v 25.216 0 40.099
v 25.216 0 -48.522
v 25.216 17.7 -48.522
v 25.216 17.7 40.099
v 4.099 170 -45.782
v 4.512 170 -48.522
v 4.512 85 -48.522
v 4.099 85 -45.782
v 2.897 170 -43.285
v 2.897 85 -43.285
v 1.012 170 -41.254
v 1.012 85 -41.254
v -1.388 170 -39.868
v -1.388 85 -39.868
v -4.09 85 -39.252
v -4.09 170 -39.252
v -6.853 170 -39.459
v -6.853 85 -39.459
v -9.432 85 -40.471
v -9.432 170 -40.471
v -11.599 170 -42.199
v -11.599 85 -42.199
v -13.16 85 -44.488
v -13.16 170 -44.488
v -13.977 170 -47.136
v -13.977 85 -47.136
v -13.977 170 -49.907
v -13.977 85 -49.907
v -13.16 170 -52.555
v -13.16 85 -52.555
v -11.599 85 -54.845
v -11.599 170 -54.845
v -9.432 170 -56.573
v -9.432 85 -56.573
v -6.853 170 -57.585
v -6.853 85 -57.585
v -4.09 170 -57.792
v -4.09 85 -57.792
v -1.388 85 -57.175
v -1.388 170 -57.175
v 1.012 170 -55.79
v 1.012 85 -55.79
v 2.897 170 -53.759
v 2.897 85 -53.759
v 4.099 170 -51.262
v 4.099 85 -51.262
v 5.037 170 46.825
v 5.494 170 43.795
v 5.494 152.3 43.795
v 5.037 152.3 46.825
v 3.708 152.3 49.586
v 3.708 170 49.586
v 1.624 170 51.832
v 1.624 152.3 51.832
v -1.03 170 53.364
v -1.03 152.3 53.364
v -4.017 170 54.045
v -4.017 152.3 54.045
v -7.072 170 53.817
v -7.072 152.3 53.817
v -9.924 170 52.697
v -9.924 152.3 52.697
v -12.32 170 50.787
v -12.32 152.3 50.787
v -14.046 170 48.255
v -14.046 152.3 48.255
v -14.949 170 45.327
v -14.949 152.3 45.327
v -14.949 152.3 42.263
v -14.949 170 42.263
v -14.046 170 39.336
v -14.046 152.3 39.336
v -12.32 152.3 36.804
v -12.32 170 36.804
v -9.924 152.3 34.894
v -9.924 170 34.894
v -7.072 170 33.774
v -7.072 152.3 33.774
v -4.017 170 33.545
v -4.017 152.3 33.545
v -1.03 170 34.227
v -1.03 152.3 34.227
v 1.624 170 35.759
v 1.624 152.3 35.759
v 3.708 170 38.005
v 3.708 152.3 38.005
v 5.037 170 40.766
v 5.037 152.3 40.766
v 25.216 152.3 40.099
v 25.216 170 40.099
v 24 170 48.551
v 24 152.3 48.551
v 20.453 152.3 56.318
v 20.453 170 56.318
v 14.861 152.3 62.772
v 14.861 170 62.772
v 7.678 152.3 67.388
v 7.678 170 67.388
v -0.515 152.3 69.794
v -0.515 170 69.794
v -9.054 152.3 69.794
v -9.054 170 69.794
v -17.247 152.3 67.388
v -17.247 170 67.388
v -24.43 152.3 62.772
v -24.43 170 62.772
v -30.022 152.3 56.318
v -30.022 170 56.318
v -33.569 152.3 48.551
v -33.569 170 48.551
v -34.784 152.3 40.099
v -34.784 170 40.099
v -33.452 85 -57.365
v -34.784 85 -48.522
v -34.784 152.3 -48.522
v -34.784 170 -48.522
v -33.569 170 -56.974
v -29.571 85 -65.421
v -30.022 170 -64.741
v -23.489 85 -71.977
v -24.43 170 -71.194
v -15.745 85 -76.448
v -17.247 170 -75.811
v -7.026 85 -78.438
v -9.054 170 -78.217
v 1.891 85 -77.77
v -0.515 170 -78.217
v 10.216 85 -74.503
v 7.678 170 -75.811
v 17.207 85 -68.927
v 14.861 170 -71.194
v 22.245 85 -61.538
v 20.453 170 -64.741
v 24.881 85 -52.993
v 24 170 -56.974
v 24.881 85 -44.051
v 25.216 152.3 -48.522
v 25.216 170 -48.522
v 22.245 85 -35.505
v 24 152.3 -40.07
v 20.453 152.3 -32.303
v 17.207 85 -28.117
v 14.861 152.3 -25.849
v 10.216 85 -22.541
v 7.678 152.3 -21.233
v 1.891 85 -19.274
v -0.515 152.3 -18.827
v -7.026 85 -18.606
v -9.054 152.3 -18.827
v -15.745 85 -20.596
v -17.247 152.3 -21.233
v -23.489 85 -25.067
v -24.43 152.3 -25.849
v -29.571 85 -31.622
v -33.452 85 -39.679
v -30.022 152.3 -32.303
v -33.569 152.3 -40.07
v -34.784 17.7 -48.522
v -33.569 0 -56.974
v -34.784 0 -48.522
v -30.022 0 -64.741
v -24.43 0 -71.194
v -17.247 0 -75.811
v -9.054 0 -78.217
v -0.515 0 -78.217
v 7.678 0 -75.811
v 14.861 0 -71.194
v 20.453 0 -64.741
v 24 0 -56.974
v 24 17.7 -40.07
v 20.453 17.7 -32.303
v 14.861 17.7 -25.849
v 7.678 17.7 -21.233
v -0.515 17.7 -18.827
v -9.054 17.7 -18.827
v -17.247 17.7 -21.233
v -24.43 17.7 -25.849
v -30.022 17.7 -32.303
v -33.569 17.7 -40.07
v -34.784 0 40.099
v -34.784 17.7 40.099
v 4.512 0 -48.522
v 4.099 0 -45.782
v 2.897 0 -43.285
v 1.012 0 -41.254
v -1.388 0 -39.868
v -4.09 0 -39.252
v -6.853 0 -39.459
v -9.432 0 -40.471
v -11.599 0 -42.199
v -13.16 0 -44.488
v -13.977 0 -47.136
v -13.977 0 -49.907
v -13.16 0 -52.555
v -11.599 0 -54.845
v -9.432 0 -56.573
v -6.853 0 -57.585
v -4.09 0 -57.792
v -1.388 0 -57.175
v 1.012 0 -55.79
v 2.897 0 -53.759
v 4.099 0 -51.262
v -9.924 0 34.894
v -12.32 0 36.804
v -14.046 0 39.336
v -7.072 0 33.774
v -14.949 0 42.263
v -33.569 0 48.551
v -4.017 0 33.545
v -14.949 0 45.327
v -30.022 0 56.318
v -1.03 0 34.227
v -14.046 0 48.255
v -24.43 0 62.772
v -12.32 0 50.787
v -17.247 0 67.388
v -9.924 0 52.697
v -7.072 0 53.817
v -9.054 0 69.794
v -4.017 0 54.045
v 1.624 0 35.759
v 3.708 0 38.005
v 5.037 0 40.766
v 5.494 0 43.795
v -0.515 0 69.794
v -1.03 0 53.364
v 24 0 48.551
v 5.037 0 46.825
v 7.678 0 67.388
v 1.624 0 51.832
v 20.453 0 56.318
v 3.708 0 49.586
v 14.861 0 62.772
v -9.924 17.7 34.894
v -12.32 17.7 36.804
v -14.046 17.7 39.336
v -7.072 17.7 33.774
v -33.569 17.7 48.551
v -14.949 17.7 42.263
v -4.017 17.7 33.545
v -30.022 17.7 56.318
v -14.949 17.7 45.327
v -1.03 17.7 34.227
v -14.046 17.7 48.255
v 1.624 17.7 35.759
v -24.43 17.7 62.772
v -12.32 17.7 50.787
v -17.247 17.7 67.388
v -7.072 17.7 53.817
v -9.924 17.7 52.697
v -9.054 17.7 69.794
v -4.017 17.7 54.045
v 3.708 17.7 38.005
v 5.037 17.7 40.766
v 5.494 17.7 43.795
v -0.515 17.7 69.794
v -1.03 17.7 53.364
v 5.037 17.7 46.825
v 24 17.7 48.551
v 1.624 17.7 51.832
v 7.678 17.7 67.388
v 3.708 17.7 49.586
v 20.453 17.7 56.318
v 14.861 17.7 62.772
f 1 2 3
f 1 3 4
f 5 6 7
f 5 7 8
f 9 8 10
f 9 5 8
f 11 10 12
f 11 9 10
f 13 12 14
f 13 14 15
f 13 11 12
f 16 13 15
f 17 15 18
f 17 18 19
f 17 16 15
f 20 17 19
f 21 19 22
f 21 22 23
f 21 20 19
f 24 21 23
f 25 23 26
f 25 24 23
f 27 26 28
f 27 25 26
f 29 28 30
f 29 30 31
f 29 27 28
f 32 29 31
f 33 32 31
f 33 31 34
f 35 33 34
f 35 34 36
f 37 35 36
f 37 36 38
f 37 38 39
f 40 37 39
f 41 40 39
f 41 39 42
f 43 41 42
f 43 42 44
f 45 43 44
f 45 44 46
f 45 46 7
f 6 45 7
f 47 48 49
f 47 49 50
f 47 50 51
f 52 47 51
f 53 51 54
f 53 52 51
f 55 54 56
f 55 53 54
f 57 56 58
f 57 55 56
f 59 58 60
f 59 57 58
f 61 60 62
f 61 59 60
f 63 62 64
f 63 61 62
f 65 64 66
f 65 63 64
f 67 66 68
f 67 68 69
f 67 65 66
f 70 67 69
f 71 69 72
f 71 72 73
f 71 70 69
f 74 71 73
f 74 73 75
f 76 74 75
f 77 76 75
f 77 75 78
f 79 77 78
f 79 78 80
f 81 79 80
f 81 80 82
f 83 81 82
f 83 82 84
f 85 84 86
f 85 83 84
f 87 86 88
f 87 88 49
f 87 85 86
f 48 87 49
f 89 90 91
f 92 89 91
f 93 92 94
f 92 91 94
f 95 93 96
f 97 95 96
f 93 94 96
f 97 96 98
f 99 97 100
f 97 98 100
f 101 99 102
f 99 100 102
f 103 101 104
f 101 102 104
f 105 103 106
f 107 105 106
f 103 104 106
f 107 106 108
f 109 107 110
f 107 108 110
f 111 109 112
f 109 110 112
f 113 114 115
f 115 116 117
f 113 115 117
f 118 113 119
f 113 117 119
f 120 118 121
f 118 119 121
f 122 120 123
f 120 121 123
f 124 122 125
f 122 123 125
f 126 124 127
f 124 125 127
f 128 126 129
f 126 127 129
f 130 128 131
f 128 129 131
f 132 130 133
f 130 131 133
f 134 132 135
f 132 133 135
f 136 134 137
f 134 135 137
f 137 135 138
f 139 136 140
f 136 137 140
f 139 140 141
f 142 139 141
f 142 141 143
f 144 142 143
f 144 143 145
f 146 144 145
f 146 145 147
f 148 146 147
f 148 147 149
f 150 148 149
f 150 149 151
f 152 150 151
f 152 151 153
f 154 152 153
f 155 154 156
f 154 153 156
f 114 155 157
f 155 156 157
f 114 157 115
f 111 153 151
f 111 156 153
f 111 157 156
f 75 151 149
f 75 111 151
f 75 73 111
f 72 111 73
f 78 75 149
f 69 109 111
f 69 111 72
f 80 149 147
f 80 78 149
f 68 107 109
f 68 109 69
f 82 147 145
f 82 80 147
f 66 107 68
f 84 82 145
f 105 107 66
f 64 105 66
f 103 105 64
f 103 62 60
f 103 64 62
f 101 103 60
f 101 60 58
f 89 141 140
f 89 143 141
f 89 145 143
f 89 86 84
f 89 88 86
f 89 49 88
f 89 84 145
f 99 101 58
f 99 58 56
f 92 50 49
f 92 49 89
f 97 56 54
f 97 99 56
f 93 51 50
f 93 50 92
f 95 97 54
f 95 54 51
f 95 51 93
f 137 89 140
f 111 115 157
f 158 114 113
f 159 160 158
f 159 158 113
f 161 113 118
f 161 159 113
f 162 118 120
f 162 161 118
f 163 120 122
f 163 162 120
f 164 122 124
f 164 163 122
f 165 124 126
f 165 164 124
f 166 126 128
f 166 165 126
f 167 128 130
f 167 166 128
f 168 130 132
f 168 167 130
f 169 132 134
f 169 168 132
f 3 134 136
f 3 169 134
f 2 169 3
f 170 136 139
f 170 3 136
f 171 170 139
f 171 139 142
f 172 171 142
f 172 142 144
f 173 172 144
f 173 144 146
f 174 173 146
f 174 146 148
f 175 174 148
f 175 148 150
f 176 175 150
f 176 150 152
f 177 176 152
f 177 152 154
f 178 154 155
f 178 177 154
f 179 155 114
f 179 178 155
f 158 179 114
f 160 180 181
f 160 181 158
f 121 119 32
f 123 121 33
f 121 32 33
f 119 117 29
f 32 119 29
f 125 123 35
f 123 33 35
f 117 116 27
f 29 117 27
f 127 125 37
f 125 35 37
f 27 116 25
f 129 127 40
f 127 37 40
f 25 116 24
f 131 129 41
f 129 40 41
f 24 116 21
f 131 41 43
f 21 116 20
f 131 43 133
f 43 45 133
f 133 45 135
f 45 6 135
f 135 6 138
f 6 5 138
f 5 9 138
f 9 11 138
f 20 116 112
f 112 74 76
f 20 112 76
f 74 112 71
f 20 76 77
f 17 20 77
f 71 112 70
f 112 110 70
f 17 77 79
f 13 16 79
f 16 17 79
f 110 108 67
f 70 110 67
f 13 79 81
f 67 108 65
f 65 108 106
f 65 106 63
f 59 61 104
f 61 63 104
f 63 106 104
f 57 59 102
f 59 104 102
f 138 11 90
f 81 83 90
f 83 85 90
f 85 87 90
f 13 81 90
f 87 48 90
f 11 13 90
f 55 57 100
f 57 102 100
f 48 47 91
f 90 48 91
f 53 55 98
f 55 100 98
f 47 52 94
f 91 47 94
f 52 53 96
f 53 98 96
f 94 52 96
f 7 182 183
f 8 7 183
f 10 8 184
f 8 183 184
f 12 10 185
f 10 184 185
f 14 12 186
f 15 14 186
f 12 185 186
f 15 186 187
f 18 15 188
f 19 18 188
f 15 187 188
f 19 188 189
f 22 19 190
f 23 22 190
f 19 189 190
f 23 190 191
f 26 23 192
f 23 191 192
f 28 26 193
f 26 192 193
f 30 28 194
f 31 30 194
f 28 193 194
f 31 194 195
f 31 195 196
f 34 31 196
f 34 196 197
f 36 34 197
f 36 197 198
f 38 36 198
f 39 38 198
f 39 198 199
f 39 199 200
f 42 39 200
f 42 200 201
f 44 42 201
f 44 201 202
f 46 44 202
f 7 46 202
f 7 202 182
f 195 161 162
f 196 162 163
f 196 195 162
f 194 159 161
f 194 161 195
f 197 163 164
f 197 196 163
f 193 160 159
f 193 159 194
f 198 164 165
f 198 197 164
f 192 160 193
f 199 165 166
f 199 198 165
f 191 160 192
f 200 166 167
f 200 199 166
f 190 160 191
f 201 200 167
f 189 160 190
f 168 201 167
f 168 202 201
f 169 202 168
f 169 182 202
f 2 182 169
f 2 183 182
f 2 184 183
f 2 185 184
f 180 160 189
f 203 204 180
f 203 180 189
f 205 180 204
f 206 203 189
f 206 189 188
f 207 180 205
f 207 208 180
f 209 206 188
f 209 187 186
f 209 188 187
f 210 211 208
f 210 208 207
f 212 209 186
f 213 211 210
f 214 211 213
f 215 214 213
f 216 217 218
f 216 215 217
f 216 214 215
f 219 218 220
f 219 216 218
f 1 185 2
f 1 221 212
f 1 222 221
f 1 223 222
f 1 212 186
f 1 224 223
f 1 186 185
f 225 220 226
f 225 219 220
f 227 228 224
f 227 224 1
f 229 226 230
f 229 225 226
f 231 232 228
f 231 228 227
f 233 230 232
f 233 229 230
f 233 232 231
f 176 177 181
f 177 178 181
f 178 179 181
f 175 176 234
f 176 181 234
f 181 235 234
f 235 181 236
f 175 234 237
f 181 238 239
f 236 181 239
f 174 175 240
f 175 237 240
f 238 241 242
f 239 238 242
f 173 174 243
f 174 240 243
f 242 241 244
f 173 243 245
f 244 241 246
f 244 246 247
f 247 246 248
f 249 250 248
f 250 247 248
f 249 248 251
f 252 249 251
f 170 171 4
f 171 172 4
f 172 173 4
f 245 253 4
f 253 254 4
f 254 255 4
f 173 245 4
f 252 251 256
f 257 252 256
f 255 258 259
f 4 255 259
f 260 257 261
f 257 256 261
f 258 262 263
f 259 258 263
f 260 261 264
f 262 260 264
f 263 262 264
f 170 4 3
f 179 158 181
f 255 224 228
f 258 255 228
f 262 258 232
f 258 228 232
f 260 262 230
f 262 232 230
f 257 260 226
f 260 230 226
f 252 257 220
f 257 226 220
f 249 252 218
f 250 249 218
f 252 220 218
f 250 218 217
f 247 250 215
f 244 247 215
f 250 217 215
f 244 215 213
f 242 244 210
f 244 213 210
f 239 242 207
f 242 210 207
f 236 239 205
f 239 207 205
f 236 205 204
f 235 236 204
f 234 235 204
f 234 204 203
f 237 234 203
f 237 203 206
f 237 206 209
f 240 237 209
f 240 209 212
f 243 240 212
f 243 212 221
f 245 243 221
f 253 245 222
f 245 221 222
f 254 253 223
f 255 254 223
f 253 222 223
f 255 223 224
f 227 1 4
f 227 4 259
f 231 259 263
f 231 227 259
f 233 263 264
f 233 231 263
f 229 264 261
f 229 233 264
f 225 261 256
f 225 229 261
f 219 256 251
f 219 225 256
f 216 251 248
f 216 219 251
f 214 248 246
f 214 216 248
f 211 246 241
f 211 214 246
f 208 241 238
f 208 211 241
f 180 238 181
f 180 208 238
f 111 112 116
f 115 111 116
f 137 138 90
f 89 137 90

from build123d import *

# Parameters (mm, degrees)
F0_R     = 9.296247
F1_DEPTH = 85
F0_R_2   = 10.278889
F2_DEPTH = 17.7


with BuildPart() as f1:
    # F0 (on Front) → F1 (new body)
    with BuildSketch(Plane.XZ):
        with BuildLine():
            ThreePointArc((25.215676, -48.521861), (-4.784324, -18.521861), (-34.784324, -48.521861))
            ThreePointArc((-34.784324, -48.521861), (-4.784324, -78.521861), (25.215676, -48.521861))
        make_face()
        with Locations((-4.784324, -48.521861)):
            Circle(F0_R, mode=Mode.SUBTRACT)
    extrude(amount=-F1_DEPTH)

    # F0 (on Front) → F2 (join)
    with BuildSketch(Plane.XZ):
        with BuildLine():
            ThreePointArc((25.215676, 40.099124), (-4.784324, 70.099124), (-34.784324, 40.099124))
            Line((-34.784324, 40.099124), (-34.784324, -48.521861))
            ThreePointArc((-34.784324, -48.521861), (-4.784324, -18.521861), (25.215676, -48.521861))
            Line((25.215676, -48.521861), (25.215676, 40.099124))
        make_face()
        with Locations((-4.784844, 43.795345)):
            Circle(F0_R_2, mode=Mode.SUBTRACT)
        with BuildLine():
            ThreePointArc((25.215676, -48.521861), (-4.784324, -18.521861), (-34.784324, -48.521861))
            ThreePointArc((-34.784324, -48.521861), (-4.784324, -78.521861), (25.215676, -48.521861))
        make_face()
        with Locations((-4.784324, -48.521861)):
            Circle(F0_R, mode=Mode.SUBTRACT)
    extrude(amount=-F2_DEPTH)

    # F4: F1 across plane


with BuildPart() as f1_1:
    add(f1.part)
    add(f1.part.mirror(Plane.XZ.offset(-85)))


solid = f1_1.part
